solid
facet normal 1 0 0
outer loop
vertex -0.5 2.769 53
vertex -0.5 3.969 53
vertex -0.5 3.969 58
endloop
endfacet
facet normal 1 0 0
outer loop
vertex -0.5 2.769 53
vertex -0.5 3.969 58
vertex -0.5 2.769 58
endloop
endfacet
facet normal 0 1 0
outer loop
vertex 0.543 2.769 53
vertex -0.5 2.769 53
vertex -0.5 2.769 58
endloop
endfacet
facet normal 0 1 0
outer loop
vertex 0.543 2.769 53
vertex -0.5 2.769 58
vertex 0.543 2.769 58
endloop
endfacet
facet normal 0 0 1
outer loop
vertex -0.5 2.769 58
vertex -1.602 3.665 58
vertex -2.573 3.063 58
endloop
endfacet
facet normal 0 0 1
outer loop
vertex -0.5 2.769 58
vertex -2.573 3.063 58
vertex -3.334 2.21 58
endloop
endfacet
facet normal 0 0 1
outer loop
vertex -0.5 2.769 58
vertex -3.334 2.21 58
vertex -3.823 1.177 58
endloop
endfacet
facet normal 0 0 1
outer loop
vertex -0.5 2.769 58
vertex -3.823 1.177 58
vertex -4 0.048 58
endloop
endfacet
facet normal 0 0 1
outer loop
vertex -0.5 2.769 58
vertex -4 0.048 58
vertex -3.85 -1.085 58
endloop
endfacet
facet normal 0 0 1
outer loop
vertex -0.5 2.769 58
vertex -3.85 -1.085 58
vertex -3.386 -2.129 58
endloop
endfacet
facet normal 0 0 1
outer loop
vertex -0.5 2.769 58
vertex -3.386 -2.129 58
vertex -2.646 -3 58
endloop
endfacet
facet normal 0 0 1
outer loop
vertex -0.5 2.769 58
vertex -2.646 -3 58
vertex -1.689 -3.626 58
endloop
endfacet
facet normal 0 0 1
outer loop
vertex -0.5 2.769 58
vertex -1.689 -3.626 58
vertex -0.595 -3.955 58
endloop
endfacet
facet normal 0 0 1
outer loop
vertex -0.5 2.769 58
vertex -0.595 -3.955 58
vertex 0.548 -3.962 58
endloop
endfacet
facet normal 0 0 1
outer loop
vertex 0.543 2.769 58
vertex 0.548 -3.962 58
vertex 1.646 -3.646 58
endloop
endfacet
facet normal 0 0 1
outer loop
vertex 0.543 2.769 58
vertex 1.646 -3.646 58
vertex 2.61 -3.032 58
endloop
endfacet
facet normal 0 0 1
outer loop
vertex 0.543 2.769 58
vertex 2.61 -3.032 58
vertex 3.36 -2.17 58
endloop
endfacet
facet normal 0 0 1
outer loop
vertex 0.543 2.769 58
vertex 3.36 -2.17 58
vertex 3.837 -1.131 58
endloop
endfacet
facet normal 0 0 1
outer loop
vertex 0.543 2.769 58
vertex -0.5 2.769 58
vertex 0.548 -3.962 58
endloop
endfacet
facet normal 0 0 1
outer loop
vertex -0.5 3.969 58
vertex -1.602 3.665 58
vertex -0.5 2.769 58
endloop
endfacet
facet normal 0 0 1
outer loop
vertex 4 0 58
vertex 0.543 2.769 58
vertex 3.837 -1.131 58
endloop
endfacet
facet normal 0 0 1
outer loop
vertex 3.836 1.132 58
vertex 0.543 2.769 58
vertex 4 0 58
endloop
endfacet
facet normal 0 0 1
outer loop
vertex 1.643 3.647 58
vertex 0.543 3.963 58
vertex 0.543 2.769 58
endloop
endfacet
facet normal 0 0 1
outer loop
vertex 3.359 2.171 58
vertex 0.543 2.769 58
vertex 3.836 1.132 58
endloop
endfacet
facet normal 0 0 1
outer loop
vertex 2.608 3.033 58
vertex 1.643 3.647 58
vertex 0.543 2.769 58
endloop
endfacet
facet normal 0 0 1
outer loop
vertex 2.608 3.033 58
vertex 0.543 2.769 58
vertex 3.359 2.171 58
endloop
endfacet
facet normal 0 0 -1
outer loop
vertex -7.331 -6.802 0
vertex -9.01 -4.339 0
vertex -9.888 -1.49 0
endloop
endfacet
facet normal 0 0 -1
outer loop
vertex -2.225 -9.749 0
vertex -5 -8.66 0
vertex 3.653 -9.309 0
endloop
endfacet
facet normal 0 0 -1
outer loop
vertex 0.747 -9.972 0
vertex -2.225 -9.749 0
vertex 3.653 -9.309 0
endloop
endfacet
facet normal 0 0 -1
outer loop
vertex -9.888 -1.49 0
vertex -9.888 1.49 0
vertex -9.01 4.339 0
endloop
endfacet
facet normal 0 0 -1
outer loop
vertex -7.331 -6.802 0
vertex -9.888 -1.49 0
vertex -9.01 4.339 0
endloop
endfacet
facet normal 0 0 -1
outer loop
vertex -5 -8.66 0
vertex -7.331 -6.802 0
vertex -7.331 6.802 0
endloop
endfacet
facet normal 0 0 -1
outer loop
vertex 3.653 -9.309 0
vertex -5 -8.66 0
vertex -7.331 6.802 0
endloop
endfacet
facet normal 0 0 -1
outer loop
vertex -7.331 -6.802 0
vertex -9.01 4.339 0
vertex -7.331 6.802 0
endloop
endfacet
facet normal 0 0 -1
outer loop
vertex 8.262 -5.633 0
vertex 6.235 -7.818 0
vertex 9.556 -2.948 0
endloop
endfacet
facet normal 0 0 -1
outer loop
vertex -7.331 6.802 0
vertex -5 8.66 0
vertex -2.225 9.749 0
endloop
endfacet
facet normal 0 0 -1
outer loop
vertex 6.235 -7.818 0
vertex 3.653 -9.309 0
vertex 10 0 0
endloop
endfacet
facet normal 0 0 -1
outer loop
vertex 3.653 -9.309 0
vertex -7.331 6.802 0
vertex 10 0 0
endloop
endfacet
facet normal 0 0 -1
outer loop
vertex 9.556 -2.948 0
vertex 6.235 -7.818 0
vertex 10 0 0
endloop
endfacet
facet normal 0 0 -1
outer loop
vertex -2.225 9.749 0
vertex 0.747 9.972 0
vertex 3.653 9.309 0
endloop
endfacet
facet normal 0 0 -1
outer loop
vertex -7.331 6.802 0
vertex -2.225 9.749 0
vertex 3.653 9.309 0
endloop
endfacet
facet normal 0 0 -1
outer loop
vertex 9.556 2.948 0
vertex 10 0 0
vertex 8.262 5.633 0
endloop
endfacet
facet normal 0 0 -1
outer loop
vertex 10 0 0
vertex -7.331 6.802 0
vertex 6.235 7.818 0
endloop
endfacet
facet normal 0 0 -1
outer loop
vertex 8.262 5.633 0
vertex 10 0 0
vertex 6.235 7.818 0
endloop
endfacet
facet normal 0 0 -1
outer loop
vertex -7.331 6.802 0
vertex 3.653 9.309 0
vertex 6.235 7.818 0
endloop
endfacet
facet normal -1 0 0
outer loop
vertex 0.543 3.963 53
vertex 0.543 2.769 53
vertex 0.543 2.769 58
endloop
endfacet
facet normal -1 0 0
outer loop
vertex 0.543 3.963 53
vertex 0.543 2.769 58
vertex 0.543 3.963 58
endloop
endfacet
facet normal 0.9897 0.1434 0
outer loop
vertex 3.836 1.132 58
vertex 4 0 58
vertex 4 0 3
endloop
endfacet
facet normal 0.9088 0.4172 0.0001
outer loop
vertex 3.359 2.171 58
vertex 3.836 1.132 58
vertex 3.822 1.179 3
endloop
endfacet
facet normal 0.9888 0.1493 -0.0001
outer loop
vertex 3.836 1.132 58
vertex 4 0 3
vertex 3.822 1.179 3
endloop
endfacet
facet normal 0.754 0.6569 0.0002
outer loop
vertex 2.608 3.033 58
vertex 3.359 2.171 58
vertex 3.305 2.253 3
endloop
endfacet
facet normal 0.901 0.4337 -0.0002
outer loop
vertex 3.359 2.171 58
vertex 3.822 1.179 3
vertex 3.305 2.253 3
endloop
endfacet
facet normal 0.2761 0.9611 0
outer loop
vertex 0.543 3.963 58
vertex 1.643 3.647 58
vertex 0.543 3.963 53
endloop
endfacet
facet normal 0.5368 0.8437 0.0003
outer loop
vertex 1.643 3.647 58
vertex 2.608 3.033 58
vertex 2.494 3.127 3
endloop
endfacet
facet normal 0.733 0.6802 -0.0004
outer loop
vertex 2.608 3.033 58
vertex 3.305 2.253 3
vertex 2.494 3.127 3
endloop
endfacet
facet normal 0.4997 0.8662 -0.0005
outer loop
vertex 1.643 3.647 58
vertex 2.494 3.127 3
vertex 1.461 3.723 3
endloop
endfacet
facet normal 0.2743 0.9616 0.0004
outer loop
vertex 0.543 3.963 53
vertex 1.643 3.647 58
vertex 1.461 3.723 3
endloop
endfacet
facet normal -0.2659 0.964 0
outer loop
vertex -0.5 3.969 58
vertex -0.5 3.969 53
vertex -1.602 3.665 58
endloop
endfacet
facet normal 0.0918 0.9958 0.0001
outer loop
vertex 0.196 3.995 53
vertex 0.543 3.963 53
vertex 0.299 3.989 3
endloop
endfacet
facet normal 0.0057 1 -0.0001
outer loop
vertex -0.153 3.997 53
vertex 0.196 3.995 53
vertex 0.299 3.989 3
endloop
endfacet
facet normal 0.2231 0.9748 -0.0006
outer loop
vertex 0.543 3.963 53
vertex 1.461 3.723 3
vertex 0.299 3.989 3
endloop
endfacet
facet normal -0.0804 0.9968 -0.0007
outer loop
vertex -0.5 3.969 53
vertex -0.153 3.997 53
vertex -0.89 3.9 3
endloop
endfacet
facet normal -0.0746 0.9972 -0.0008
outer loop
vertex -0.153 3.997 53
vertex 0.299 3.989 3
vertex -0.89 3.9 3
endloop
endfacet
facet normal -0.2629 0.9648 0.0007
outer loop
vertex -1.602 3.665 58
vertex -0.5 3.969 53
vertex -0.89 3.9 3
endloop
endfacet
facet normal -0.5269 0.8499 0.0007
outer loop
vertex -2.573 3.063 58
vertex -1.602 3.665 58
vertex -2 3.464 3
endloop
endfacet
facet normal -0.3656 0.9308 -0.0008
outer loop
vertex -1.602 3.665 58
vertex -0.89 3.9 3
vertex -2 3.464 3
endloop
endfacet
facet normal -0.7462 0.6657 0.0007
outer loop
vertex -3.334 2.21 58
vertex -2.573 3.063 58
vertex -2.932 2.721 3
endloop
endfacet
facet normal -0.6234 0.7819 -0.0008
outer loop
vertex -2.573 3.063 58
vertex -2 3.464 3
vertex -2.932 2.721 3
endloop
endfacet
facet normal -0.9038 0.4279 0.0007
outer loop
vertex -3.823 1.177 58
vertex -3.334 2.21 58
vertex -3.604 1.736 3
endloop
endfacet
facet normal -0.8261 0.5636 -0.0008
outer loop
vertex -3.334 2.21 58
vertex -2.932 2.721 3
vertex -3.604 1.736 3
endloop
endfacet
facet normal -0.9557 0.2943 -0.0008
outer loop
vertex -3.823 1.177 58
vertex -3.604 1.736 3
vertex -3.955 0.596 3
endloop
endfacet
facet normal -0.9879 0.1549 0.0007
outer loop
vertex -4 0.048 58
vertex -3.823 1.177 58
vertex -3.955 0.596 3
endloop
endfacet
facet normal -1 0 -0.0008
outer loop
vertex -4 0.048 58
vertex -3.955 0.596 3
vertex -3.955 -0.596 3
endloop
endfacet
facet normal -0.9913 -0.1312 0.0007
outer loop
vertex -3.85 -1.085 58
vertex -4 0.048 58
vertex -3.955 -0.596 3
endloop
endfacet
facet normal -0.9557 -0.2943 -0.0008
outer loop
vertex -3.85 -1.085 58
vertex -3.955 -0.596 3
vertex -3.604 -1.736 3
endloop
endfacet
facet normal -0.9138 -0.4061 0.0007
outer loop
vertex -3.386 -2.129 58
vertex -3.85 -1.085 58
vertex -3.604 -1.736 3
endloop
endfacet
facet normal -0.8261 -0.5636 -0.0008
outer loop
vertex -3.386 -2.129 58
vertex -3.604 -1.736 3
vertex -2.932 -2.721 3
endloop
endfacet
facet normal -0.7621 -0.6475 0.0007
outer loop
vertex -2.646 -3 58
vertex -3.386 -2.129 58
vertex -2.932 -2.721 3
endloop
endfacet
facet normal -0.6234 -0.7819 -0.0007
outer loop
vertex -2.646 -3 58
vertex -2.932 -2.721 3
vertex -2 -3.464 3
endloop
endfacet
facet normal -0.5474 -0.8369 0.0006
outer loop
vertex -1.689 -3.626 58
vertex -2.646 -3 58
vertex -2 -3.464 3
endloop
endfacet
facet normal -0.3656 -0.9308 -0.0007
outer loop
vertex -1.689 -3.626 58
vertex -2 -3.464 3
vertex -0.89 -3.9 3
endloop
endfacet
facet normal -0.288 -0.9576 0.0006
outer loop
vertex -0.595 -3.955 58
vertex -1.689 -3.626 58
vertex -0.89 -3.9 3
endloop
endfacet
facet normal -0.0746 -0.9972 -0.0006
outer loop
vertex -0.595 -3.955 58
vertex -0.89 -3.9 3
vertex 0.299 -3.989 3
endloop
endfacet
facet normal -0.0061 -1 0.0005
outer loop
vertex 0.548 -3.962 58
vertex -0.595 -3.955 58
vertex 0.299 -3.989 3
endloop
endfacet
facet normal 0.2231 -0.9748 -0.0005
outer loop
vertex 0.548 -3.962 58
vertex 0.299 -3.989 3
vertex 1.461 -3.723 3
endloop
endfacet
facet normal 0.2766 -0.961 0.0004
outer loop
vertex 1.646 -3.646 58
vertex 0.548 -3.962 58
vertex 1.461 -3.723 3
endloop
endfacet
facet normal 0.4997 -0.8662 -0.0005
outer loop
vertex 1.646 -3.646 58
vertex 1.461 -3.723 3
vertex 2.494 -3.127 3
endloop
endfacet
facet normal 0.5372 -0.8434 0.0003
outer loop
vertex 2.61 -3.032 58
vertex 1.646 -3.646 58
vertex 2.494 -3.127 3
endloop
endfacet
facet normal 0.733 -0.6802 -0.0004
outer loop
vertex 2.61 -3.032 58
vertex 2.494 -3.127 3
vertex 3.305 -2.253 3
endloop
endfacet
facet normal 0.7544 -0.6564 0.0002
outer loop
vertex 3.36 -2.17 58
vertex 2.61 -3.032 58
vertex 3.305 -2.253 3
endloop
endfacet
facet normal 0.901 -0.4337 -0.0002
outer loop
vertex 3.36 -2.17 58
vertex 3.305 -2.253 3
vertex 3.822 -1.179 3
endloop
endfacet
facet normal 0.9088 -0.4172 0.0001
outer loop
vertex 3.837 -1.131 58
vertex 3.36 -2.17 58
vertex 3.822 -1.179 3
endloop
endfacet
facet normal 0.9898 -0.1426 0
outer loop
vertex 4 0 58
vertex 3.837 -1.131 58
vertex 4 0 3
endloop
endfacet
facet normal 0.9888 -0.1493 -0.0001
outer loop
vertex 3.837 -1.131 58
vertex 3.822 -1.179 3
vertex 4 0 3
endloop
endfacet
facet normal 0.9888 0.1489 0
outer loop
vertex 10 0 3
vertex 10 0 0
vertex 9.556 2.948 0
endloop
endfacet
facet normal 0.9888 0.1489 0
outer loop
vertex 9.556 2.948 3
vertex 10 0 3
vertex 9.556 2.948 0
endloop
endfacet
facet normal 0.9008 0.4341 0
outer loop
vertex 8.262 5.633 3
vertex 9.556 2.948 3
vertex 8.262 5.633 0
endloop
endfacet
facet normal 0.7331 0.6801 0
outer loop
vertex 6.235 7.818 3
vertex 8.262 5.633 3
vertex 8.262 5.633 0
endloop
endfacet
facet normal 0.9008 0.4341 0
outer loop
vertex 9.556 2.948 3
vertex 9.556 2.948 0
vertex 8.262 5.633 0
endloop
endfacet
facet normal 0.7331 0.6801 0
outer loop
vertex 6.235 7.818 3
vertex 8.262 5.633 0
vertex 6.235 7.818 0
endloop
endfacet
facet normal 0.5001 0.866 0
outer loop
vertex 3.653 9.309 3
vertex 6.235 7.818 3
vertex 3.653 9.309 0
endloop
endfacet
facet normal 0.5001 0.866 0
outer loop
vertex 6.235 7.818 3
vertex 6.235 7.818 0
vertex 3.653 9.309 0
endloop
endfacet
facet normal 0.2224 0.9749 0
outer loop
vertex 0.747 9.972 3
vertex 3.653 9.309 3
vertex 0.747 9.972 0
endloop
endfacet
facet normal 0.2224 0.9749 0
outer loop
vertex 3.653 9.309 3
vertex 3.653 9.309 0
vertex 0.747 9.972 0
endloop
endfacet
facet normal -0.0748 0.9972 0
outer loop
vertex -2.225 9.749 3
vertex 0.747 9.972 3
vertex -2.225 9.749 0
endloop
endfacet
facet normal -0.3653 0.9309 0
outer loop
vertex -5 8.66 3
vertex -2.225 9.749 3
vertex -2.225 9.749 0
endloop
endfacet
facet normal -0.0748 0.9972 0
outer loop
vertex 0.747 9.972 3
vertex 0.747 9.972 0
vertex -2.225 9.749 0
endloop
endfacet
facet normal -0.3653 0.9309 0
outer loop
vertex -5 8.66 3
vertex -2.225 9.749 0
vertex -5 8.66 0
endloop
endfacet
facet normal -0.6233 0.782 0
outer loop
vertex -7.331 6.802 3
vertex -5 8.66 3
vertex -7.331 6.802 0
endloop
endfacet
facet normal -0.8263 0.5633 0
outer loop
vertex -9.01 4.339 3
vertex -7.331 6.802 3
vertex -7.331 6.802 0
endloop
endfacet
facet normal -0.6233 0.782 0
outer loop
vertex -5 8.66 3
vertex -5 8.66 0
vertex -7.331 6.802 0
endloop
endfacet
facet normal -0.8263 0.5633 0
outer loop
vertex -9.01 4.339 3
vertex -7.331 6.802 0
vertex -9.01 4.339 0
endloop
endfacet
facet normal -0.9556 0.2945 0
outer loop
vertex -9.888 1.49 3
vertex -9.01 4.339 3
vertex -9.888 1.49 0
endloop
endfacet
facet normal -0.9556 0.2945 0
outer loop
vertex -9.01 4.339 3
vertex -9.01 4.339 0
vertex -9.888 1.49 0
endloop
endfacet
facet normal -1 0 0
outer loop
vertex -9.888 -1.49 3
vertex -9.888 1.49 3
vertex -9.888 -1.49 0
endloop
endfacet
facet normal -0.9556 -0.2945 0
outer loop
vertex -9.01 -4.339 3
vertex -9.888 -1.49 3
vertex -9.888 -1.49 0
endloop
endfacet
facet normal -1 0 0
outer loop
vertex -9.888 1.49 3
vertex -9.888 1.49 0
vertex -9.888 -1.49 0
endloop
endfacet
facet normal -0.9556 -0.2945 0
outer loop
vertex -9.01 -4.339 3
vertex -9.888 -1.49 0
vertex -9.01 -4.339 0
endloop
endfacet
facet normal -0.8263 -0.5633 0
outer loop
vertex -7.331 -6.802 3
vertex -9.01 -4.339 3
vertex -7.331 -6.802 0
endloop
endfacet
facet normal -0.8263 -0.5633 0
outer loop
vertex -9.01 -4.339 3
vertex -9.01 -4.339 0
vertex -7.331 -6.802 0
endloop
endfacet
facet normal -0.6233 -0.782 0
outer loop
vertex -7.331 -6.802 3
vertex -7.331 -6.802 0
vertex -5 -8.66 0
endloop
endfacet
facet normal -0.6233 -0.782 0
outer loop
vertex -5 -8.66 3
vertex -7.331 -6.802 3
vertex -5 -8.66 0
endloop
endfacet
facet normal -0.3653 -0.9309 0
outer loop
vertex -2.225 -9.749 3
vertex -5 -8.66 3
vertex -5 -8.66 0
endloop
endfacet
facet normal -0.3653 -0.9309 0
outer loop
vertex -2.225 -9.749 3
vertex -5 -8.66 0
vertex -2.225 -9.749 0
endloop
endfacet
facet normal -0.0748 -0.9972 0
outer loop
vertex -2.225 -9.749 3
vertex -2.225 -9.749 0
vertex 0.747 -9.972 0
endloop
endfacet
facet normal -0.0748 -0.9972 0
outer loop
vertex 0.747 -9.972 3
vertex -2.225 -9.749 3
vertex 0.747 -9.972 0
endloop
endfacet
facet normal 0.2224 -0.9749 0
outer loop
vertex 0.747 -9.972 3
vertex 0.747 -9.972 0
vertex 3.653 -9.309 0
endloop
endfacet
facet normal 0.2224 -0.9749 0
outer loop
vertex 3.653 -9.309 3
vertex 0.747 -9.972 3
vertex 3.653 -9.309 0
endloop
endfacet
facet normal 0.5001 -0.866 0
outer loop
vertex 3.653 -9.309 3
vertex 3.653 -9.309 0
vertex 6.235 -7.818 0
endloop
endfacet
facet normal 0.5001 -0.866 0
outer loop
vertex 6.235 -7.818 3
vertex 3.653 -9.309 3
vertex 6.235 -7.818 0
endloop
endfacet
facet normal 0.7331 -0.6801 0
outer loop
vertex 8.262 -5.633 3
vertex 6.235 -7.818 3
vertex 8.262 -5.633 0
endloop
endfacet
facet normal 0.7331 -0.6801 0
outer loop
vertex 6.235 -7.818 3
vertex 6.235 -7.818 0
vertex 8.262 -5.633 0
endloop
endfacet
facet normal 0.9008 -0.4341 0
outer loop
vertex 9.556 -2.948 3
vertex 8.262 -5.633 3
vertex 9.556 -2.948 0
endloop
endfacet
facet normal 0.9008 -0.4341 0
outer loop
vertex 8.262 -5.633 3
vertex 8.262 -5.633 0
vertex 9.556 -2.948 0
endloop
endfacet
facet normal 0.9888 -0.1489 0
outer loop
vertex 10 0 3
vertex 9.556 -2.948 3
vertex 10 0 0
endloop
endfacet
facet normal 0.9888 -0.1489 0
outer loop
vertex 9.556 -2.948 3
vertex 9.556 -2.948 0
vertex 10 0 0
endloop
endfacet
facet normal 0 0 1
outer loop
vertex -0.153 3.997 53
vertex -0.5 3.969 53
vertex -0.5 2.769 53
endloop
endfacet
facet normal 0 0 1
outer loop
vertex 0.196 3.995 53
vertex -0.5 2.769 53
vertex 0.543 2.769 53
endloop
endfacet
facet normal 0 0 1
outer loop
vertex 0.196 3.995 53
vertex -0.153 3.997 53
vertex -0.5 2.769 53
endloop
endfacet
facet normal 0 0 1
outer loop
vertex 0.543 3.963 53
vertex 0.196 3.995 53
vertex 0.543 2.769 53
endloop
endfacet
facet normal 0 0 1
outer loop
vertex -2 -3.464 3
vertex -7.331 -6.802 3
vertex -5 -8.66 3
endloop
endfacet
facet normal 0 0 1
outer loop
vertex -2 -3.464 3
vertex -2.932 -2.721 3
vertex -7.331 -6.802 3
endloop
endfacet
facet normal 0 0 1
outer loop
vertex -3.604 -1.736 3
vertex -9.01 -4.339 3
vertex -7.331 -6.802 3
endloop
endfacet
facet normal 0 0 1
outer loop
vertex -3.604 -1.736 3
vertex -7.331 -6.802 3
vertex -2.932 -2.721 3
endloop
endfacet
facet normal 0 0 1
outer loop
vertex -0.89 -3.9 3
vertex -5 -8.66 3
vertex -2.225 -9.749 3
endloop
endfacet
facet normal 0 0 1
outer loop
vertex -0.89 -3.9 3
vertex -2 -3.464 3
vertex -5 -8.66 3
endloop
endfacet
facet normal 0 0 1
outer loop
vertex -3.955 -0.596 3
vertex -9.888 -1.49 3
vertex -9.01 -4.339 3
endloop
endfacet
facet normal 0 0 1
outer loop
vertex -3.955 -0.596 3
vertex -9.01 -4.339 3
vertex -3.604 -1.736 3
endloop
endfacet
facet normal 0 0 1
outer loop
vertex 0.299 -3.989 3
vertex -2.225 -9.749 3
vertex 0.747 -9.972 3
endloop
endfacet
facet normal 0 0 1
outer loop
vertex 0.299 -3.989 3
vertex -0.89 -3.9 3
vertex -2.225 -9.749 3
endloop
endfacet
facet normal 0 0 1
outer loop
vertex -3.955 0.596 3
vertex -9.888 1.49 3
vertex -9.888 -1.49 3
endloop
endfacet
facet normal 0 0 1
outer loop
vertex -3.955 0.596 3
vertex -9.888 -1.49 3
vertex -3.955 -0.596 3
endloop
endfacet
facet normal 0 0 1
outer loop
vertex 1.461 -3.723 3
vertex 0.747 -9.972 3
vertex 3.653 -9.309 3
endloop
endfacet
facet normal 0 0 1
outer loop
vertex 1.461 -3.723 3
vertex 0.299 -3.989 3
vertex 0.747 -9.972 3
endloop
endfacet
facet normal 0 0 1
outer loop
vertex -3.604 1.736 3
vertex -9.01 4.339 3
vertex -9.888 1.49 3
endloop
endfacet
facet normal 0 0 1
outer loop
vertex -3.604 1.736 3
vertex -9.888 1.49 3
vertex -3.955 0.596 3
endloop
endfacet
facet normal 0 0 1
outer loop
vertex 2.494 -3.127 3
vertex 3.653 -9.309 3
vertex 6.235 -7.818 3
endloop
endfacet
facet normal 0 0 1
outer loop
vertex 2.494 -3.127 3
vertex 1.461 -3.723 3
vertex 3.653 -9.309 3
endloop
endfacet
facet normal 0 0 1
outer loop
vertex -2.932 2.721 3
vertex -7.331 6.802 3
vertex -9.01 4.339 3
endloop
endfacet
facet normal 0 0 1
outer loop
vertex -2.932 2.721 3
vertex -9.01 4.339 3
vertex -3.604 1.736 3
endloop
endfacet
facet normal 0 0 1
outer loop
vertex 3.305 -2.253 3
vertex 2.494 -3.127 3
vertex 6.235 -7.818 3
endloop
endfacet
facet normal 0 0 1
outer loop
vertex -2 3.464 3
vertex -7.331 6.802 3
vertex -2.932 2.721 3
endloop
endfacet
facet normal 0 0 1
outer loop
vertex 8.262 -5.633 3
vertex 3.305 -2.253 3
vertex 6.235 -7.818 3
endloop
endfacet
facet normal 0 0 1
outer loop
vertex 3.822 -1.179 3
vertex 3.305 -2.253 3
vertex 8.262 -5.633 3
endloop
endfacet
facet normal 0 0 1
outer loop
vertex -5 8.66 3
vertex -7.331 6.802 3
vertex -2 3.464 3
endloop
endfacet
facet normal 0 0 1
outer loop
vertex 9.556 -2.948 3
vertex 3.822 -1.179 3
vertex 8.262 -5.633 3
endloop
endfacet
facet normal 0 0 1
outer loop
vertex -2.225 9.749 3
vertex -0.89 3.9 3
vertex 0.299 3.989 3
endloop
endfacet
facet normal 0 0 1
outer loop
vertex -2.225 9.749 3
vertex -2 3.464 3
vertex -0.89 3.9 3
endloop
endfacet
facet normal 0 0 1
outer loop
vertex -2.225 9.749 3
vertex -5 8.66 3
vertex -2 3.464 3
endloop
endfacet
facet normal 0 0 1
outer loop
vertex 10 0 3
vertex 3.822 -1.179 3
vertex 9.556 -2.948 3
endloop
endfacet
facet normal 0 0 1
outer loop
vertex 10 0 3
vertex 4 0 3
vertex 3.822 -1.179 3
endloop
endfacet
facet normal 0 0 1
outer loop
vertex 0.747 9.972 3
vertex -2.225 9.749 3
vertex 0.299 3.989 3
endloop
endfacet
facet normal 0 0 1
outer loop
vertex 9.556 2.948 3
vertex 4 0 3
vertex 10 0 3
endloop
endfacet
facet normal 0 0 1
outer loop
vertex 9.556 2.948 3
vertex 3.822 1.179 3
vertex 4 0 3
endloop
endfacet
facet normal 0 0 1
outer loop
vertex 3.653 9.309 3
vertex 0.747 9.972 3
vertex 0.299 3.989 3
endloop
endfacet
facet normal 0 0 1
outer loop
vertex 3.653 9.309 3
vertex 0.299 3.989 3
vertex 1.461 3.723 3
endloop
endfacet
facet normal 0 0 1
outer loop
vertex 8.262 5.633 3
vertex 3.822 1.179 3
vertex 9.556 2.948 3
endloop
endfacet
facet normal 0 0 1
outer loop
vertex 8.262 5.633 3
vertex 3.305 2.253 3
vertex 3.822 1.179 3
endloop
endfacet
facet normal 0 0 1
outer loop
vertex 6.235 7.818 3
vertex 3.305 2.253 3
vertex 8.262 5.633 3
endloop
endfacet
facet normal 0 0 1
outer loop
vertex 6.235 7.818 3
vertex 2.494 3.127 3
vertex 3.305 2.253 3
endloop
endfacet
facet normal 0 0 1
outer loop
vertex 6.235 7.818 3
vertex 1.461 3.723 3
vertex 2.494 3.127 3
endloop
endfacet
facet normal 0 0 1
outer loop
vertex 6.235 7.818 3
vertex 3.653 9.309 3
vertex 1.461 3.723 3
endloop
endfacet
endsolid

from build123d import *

# Parameters (mm, degrees)
SKETCH1_R           = 10
BOSS_EXTRUDE1_DEPTH = 3
SKETCH2_R           = 4
BOSS_EXTRUDE2_DEPTH = 55
CUT_EXTRUDE1_DEPTH  = 10


with BuildPart() as part:
    # Sketch1 → Boss-Extrude1 (new body)
    with BuildSketch(Plane.XY):
        Circle(SKETCH1_R)
    extrude(amount=BOSS_EXTRUDE1_DEPTH)

    # Sketch2 → Boss-Extrude2 (add)
    with BuildSketch(Plane.XY.offset(3)):
        Circle(SKETCH2_R)
    extrude(amount=BOSS_EXTRUDE2_DEPTH)

    # Sketch3 → Cut-Extrude1 (cut)
    with BuildSketch(Plane.XY.offset(53)):
        with BuildLine():
            Line((-0.5, 3.968626967), (-0.5, 2.768626967))
            Line((-0.5, 2.768626967), (0.543300129, 2.768626967))
            Line((0.543300129, 2.768626967), (0.543300129, 3.962931361))
            ThreePointArc((0.543300129, 3.962931361), (0.021836558, 3.999940395), (-0.5, 3.968626967))
        make_face()
    extrude(amount=CUT_EXTRUDE1_DEPTH, mode=Mode.SUBTRACT)


solid = part.part
